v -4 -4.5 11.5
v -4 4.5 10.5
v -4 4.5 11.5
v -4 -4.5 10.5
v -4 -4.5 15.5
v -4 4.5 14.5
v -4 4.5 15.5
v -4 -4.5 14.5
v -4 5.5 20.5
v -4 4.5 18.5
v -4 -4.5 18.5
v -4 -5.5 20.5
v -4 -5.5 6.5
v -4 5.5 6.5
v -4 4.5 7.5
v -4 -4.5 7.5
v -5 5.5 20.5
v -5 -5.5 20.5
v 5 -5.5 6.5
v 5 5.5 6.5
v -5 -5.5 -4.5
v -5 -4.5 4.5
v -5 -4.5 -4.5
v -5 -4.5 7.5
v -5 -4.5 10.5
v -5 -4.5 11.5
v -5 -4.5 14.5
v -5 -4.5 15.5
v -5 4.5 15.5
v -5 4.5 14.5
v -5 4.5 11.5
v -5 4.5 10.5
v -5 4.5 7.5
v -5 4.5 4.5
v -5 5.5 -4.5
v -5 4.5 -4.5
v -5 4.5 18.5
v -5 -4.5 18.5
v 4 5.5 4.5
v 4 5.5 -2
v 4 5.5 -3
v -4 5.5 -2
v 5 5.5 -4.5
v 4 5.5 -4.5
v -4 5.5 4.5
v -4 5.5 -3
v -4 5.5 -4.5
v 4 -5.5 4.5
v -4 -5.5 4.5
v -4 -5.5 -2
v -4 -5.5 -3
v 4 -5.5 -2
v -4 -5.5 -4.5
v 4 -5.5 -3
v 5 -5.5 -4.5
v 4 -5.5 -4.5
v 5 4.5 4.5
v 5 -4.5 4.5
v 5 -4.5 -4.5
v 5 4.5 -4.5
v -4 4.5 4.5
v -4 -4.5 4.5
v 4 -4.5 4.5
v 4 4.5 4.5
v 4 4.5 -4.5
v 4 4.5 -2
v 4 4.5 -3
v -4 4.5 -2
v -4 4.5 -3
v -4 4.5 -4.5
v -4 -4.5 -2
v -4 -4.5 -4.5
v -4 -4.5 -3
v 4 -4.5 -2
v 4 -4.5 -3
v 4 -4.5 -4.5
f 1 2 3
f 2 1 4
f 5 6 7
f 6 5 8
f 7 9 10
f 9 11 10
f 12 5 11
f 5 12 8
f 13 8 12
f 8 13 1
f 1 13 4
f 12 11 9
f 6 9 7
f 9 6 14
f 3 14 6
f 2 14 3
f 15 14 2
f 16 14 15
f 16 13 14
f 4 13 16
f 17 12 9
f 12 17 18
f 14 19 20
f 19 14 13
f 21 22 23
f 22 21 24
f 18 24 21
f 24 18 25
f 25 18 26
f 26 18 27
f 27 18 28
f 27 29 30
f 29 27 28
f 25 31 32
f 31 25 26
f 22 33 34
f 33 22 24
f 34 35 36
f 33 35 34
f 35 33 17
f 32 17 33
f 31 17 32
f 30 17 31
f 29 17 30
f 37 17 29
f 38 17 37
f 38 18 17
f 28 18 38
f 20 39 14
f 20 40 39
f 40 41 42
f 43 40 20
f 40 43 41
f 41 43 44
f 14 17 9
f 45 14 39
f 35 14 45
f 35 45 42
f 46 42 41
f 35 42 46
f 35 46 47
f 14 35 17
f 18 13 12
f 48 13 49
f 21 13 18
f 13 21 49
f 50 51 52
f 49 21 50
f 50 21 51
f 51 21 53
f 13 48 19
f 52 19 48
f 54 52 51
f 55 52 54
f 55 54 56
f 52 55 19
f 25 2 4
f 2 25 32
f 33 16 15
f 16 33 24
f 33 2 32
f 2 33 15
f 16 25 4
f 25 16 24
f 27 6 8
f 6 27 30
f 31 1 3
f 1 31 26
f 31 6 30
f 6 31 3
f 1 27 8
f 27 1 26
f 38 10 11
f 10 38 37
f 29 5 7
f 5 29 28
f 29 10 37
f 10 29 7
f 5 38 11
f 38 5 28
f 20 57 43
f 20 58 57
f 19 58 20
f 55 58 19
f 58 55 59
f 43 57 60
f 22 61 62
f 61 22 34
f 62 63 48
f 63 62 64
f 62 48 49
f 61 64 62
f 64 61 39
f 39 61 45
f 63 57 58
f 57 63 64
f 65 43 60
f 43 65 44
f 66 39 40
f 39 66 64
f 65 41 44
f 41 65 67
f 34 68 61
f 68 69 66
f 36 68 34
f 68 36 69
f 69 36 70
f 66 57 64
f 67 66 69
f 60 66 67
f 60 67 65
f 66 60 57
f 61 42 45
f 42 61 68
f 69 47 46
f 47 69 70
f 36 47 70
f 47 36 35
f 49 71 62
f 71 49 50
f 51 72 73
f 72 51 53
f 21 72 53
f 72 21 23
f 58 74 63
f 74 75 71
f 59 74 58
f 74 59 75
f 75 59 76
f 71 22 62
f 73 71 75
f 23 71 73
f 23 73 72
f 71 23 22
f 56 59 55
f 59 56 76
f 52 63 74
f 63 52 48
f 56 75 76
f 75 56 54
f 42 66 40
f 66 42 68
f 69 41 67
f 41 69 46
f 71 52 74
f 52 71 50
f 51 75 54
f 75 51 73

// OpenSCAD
module Chair_03(){
    // INPUT DATA

    Table_Leg = [1,1,9];      // lenght, width and height of legs
    Table_Top_Height = 2;     //  Height of theSeat

    Leg_Distance_x = 9;        
    Leg_Distance_y = 10;     

    seat_height = 14;         // Backpost size 
    seat_width = 1;           // Backpost width (x axis)


    // OUTPUT DATA

    translate([Leg_Distance_x*0.5,Leg_Distance_y*0.5,0])
    color("PowderBlue")
    cube([Table_Leg[0],Table_Leg[1],Table_Leg[2]],center=true);

    translate([-Leg_Distance_x*0.5,Leg_Distance_y*0.5,0])
    color("PowderBlue")
    cube([Table_Leg[0],Table_Leg[1],Table_Leg[2]],center=true);

    translate([-Leg_Distance_x*0.5,-Leg_Distance_y*0.5,0])
    color("PowderBlue")
    cube([Table_Leg[0],Table_Leg[1],Table_Leg[2]],center=true);

    translate([Leg_Distance_x*0.5,-Leg_Distance_y*0.5,0])
    color("PowderBlue")
    cube([Table_Leg[0],Table_Leg[1],Table_Leg[2]],center=true);

    Table_Upper = [Leg_Distance_x + Table_Leg[0],Leg_Distance_y +Table_Leg[1],Table_Top_Height];

    seat = [seat_width,Leg_Distance_y+Table_Leg[1],seat_height];

    translate([0,0,Table_Leg[2]*0.5+Table_Top_Height*0.5])
    color("PowderBlue")
    cube([Table_Upper[0],Table_Upper[1],Table_Upper[2]],center=true);

    
    difference(){
    translate([-Table_Upper[0]*0.5+seat[0]*0.5,0,Table_Leg[2]*0.5+Table_Top_Height+seat_height*0.5])
    color("YellowGreen")
    cube([seat[0],seat[1],seat[2]],center=true);
    
    translate([0,0,9]){
    color("YellowGreen")
    cube([15,9,3],center=true);
    }
    
    translate([0,0,13]){
    color("YellowGreen")
    cube([15,9,3],center=true);
    }
    
    translate([0,0,17]){
    color("YellowGreen")
    cube([15,9,3],center=true);
    }
    }
    
    translate([0,5,-2.5])
    color("YellowGreen")
    cube([8,1,1],center=true);
    
    translate([0,-5,-2.5])
    color("YellowGreen")
    cube([8,1,1],center=true);
}


Chair_03();

// Written by Nicolì Angelo (Gengio) 2024: 
// MIT License

//Permission is hereby granted, free of charge, to any person obtaining a copy of this software and associated documentation files (the "Software"), to deal in the Software without restriction, including without limitation the rights to use, copy, modify, merge, publish, distribute, sublicense, and/or sell copies of the Software, and to permit persons to whom the Software is furnished to do so, subject to the following conditions:

//The above copyright notice and this permission notice shall be included in all copies or substantial portions of the Software.

//THE SOFTWARE IS PROVIDED "AS IS", WITHOUT WARRANTY OF ANY KIND, EXPRESS OR IMPLIED, INCLUDING BUT NOT LIMITED TO THE WARRANTIES OF MERCHANTABILITY, FITNESS FOR A PARTICULAR PURPOSE AND NONINFRINGEMENT. IN NO EVENT SHALL THE AUTHORS OR COPYRIGHT HOLDERS BE LIABLE FOR ANY CLAIM, DAMAGES OR OTHER LIABILITY, WHETHER IN AN ACTION OF CONTRACT, TORT OR OTHERWISE, ARISING FROM, OUT OF OR IN CONNECTION WITH THE SOFTWARE OR THE USE OR OTHER DEALINGS IN THE SOFTWARE.
